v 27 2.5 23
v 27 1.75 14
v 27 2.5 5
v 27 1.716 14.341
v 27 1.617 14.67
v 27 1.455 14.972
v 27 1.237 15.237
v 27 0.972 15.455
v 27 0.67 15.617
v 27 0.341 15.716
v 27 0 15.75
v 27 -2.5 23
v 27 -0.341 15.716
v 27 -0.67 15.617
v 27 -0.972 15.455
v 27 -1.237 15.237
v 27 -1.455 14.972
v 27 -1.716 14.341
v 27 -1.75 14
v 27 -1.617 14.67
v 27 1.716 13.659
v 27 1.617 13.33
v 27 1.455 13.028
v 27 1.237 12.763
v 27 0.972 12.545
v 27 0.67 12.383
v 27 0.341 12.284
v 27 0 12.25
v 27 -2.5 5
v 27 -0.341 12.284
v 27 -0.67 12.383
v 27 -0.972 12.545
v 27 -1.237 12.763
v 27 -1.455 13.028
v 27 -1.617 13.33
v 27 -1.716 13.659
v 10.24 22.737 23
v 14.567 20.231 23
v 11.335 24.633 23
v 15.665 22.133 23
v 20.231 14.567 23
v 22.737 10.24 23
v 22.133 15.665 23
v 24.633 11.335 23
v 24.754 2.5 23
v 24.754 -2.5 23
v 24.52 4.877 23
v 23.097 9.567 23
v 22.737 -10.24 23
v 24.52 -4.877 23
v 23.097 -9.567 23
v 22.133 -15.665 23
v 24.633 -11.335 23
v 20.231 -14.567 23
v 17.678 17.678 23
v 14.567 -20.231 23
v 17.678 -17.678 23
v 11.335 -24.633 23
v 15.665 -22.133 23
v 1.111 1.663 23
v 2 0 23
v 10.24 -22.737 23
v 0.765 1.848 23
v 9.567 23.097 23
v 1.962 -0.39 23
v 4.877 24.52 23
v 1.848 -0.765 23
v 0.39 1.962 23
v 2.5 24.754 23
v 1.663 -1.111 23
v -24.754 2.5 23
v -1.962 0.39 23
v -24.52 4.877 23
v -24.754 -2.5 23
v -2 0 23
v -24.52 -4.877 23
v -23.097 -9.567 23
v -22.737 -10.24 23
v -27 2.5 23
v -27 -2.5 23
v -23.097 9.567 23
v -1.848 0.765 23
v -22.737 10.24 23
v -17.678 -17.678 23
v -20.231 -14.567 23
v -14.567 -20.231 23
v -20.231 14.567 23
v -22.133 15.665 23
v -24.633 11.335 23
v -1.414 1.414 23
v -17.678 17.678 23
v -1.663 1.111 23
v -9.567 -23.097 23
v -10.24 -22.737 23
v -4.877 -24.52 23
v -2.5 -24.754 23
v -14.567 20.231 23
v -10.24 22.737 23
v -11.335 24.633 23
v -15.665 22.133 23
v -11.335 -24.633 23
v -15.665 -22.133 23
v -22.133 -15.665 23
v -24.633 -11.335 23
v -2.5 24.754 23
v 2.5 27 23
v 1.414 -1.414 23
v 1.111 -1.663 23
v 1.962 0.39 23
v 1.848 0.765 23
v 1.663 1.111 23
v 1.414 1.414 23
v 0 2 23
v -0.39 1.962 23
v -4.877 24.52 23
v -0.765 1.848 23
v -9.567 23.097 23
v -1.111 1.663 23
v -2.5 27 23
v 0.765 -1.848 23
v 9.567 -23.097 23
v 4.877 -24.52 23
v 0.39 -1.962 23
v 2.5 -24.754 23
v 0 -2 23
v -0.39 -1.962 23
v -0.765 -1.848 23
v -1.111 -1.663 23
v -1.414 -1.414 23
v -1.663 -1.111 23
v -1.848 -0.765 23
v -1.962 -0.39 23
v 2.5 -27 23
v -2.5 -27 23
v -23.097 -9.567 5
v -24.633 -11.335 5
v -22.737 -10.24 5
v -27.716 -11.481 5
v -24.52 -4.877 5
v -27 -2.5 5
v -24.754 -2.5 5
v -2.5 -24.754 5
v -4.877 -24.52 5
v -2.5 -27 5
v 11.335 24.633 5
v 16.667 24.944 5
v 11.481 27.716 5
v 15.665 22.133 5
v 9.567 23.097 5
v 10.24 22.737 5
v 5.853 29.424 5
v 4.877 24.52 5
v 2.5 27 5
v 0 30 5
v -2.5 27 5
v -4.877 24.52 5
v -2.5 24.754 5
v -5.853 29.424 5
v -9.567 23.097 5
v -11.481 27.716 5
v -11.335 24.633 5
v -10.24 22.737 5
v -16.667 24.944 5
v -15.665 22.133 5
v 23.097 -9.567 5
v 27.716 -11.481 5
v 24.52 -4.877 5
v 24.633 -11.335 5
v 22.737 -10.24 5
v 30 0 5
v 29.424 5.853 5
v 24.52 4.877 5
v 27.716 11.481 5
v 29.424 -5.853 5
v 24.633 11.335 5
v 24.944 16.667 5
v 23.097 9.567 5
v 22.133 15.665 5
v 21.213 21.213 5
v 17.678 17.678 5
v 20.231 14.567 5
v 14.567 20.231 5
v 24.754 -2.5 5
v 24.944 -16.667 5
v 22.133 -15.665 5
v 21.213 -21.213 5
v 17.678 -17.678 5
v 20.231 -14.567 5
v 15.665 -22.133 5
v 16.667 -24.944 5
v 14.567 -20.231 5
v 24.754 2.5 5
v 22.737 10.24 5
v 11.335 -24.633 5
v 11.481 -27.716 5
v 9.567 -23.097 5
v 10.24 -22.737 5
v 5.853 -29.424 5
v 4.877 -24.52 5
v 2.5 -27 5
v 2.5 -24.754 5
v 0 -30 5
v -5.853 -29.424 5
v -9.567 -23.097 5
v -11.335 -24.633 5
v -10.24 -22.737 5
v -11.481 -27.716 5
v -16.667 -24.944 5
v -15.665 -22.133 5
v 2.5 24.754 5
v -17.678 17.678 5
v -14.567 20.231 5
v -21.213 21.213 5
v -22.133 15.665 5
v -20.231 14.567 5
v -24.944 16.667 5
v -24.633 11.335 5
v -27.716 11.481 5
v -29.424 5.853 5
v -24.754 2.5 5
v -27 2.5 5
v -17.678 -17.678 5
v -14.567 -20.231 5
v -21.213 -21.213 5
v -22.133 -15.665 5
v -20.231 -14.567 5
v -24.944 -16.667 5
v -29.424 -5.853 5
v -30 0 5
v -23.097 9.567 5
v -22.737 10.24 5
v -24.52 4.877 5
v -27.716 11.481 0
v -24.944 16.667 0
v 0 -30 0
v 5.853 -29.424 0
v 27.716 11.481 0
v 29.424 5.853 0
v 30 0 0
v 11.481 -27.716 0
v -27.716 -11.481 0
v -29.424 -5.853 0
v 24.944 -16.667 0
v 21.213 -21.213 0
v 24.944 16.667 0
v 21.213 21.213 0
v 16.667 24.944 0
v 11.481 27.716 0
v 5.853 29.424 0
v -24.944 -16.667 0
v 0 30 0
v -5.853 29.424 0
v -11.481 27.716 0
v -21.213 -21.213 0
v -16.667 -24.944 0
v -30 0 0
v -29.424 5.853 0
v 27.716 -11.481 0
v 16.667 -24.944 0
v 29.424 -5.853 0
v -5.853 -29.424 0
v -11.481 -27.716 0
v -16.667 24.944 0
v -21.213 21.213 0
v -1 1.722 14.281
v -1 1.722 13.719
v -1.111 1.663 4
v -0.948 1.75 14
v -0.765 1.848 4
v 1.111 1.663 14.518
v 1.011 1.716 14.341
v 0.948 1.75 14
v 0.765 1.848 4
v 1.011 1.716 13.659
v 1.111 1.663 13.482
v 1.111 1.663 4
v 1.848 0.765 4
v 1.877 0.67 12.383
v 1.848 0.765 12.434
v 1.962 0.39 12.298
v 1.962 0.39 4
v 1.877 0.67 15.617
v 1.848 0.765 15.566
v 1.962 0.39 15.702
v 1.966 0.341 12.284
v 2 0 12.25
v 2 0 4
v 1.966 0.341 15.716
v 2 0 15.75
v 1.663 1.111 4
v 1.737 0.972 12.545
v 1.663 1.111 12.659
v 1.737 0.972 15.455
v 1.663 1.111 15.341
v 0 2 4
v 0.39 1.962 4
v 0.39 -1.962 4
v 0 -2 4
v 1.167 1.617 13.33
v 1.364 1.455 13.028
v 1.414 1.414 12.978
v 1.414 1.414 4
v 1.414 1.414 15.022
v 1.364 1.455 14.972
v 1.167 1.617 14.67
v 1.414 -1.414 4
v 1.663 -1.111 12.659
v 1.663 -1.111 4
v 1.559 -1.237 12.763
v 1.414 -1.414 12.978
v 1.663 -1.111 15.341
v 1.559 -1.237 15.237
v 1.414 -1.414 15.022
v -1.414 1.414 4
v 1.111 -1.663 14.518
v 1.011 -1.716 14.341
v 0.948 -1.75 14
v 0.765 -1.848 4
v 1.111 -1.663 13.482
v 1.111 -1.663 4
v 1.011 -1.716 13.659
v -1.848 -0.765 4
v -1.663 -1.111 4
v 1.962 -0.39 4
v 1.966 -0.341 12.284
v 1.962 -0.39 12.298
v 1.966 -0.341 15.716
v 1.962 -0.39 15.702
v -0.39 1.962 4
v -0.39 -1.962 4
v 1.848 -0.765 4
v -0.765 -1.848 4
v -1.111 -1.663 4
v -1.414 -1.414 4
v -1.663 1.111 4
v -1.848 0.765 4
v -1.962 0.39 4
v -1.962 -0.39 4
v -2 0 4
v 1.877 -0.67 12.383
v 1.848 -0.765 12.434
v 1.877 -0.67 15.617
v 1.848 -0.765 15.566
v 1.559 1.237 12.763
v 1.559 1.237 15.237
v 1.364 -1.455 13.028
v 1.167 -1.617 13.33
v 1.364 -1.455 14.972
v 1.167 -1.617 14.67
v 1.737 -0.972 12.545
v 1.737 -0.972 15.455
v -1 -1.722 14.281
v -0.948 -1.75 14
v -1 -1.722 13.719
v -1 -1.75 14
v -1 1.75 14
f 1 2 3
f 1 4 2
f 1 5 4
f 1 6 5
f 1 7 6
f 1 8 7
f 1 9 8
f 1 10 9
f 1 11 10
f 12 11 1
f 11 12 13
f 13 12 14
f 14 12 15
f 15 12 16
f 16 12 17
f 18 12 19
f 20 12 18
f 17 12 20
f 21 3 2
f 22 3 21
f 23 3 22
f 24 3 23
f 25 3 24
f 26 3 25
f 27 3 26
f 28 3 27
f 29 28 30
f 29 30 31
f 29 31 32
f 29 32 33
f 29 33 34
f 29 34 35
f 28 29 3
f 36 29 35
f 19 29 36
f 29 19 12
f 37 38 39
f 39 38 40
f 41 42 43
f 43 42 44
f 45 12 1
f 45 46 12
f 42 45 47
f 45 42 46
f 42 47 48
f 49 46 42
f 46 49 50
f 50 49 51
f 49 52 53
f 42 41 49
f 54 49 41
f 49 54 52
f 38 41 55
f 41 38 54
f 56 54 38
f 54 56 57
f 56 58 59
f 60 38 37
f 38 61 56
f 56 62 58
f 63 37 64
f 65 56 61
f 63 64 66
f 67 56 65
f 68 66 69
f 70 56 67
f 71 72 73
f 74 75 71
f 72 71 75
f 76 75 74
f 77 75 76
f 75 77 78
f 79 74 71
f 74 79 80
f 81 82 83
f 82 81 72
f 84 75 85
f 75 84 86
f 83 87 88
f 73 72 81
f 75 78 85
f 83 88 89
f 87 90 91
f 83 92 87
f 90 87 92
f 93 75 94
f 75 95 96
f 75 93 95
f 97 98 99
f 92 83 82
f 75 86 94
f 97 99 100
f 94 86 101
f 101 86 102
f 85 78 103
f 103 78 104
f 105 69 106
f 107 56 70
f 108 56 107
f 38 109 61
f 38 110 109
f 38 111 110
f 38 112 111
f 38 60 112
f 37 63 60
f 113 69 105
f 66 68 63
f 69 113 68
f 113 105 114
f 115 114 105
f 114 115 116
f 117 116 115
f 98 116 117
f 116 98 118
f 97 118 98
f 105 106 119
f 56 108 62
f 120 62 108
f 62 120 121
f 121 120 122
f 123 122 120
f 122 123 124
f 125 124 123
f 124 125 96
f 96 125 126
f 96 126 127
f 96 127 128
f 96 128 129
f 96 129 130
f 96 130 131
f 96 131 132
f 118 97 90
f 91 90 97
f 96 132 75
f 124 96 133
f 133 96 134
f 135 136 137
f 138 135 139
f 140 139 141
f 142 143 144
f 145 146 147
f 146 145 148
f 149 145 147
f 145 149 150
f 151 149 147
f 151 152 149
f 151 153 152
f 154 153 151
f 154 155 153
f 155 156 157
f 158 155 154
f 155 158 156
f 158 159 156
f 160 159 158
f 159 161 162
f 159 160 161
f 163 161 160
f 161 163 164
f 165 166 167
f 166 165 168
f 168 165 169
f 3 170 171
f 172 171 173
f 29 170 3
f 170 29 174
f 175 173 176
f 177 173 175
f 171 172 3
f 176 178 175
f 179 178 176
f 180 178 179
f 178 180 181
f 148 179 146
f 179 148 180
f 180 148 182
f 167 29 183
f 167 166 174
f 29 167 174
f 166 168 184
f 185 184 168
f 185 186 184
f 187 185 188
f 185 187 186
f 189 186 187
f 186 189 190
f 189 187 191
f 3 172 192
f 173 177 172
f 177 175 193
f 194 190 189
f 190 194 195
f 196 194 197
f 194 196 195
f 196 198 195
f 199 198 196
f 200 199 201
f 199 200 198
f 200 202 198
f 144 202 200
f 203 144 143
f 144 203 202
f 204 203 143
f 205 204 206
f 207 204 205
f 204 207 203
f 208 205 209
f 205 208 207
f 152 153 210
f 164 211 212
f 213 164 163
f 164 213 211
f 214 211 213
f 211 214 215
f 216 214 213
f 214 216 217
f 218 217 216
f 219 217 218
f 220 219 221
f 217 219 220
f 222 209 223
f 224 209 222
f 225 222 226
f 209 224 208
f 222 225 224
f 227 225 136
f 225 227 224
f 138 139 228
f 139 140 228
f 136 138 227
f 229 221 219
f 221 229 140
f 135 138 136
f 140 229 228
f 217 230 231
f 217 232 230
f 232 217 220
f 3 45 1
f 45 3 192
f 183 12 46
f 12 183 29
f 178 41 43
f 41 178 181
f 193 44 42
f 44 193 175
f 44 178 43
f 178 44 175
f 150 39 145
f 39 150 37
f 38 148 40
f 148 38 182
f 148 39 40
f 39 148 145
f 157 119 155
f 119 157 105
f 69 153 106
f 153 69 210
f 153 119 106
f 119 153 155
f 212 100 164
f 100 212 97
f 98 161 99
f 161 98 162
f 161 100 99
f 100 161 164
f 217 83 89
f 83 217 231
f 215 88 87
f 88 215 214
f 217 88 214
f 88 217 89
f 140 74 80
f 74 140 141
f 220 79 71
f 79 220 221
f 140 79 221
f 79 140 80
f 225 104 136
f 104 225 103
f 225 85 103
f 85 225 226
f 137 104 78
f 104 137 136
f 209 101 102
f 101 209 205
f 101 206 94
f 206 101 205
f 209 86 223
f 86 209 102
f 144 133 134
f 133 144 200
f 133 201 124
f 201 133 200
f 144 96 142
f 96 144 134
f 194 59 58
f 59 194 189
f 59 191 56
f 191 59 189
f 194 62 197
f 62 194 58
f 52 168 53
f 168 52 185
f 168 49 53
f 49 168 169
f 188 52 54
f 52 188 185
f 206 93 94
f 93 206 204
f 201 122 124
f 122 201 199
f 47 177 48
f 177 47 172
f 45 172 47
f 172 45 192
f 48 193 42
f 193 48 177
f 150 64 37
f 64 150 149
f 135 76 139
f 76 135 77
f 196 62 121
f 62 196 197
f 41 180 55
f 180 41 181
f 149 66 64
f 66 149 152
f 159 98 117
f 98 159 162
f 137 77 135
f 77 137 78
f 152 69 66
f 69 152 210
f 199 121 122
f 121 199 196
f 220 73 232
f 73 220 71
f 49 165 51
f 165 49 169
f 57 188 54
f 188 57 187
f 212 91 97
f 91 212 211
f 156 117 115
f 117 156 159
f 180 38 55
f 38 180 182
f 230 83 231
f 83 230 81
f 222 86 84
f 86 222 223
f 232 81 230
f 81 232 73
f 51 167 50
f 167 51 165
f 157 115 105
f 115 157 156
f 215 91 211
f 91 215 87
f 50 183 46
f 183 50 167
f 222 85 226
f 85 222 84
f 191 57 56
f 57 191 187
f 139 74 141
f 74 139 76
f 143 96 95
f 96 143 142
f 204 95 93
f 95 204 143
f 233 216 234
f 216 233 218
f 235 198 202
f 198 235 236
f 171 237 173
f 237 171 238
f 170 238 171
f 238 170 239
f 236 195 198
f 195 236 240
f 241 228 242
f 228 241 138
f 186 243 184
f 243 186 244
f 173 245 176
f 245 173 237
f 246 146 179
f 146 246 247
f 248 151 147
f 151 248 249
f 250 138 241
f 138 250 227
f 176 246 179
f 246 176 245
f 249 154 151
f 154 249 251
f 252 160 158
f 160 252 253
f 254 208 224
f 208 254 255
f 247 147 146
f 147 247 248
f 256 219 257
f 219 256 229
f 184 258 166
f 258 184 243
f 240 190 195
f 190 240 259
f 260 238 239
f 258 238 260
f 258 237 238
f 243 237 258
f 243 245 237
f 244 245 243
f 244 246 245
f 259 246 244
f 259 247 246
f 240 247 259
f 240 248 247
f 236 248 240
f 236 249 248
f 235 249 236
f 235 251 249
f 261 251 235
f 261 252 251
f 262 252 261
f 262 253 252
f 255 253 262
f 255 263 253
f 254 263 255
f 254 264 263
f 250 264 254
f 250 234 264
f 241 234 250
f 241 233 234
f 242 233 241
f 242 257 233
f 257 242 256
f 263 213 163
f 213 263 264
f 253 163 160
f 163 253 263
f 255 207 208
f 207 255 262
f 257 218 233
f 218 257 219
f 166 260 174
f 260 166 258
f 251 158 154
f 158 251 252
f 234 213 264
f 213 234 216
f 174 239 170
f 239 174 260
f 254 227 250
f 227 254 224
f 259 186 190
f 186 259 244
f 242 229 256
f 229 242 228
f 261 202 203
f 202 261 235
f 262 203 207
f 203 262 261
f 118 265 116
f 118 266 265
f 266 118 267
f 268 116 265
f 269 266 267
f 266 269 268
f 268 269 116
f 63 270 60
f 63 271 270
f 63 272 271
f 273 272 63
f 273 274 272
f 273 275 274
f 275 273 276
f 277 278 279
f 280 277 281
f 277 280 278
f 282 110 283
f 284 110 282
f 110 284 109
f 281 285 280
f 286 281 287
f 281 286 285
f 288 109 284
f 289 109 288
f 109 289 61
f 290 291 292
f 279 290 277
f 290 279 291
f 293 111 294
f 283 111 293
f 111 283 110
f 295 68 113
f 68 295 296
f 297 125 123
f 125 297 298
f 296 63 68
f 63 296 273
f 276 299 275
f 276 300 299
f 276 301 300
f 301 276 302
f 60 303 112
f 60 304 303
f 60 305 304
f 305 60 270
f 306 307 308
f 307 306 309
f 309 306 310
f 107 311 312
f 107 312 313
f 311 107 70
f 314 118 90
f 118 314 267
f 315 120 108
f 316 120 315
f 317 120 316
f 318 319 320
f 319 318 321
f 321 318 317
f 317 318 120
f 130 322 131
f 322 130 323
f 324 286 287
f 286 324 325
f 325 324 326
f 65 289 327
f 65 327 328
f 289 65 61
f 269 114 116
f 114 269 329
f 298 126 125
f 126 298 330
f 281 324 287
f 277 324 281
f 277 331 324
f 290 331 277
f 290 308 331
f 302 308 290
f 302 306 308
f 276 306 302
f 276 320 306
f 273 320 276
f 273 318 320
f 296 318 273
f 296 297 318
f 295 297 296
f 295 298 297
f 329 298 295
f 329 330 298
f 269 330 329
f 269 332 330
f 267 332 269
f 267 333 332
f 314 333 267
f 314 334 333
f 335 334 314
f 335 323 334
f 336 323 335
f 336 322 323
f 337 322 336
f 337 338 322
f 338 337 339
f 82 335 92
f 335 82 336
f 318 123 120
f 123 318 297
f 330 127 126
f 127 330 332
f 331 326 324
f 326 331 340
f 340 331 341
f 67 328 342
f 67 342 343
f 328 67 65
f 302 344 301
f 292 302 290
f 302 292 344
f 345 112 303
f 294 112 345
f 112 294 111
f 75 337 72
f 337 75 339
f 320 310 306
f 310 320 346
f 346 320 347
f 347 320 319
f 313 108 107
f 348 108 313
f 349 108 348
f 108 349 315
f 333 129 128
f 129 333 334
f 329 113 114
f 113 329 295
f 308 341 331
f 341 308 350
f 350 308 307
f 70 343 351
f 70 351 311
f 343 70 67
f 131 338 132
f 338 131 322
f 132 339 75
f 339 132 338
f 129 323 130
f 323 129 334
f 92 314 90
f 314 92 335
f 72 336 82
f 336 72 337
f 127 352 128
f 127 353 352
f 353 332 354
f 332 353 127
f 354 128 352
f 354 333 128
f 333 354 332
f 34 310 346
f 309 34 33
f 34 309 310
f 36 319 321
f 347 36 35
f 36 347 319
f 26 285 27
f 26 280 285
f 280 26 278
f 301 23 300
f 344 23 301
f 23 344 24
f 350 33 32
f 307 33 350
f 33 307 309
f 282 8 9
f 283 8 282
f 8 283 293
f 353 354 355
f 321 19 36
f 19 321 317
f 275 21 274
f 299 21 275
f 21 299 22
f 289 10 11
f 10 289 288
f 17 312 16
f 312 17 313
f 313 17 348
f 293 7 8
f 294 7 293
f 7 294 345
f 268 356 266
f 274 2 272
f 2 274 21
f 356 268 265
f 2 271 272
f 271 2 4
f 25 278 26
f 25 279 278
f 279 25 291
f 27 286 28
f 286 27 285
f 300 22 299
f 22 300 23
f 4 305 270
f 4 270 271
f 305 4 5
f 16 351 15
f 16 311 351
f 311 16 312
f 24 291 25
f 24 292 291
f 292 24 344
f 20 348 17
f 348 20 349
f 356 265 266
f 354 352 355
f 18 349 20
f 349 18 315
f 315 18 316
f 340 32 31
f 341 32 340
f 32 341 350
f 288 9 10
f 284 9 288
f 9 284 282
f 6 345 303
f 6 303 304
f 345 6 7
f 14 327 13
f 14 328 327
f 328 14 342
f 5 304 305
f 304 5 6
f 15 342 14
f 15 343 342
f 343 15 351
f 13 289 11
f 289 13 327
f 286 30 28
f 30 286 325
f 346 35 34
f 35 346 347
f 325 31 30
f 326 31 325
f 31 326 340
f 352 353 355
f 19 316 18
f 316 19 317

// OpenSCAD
$fn = 32;

// ----------------------------------------------------------------------
// Control knob: skirt knob with grip ribs
// ----------------------------------------------------------------------

// --- parameters (mm) ---
skirt_d = 60;             // skirt diameter
skirt_t = 5;              // skirt thickness
rib_w = 5;                // grip rib width
rib_out = 3;              // grip rib radial protrusion
n_ribs = 12;              // number of grip ribs
knob_d = 50;              // knob body diameter
knob_h = 18;              // knob body height
bore_d = 4;               // shaft bore diameter
set_d = 3.5;              // set screw bore diameter

rib_step = 360 / n_ribs;  // rib angular step
total_h = skirt_t + knob_h;  // overall height

difference() {
  union() {
    translate([0, 0, skirt_t]) cylinder(h = knob_h, d = knob_d);
    cylinder(h = skirt_t, d = skirt_d);
    for (i = [0 : n_ribs - 1])
      rotate([0, 0, i * rib_step])
        translate([knob_d / 2 - 1, -rib_w / 2, skirt_t])
          cube([rib_out, rib_w, knob_h]);
  }
  translate([0, 0, skirt_t - 1]) cylinder(h = knob_h + 2, d = bore_d);
  translate([-1, 0, skirt_t + knob_h / 2]) rotate([0, 90, 0])
    cylinder(h = knob_d / 2 + bore_d / 2 + 2, d = set_d);
}
